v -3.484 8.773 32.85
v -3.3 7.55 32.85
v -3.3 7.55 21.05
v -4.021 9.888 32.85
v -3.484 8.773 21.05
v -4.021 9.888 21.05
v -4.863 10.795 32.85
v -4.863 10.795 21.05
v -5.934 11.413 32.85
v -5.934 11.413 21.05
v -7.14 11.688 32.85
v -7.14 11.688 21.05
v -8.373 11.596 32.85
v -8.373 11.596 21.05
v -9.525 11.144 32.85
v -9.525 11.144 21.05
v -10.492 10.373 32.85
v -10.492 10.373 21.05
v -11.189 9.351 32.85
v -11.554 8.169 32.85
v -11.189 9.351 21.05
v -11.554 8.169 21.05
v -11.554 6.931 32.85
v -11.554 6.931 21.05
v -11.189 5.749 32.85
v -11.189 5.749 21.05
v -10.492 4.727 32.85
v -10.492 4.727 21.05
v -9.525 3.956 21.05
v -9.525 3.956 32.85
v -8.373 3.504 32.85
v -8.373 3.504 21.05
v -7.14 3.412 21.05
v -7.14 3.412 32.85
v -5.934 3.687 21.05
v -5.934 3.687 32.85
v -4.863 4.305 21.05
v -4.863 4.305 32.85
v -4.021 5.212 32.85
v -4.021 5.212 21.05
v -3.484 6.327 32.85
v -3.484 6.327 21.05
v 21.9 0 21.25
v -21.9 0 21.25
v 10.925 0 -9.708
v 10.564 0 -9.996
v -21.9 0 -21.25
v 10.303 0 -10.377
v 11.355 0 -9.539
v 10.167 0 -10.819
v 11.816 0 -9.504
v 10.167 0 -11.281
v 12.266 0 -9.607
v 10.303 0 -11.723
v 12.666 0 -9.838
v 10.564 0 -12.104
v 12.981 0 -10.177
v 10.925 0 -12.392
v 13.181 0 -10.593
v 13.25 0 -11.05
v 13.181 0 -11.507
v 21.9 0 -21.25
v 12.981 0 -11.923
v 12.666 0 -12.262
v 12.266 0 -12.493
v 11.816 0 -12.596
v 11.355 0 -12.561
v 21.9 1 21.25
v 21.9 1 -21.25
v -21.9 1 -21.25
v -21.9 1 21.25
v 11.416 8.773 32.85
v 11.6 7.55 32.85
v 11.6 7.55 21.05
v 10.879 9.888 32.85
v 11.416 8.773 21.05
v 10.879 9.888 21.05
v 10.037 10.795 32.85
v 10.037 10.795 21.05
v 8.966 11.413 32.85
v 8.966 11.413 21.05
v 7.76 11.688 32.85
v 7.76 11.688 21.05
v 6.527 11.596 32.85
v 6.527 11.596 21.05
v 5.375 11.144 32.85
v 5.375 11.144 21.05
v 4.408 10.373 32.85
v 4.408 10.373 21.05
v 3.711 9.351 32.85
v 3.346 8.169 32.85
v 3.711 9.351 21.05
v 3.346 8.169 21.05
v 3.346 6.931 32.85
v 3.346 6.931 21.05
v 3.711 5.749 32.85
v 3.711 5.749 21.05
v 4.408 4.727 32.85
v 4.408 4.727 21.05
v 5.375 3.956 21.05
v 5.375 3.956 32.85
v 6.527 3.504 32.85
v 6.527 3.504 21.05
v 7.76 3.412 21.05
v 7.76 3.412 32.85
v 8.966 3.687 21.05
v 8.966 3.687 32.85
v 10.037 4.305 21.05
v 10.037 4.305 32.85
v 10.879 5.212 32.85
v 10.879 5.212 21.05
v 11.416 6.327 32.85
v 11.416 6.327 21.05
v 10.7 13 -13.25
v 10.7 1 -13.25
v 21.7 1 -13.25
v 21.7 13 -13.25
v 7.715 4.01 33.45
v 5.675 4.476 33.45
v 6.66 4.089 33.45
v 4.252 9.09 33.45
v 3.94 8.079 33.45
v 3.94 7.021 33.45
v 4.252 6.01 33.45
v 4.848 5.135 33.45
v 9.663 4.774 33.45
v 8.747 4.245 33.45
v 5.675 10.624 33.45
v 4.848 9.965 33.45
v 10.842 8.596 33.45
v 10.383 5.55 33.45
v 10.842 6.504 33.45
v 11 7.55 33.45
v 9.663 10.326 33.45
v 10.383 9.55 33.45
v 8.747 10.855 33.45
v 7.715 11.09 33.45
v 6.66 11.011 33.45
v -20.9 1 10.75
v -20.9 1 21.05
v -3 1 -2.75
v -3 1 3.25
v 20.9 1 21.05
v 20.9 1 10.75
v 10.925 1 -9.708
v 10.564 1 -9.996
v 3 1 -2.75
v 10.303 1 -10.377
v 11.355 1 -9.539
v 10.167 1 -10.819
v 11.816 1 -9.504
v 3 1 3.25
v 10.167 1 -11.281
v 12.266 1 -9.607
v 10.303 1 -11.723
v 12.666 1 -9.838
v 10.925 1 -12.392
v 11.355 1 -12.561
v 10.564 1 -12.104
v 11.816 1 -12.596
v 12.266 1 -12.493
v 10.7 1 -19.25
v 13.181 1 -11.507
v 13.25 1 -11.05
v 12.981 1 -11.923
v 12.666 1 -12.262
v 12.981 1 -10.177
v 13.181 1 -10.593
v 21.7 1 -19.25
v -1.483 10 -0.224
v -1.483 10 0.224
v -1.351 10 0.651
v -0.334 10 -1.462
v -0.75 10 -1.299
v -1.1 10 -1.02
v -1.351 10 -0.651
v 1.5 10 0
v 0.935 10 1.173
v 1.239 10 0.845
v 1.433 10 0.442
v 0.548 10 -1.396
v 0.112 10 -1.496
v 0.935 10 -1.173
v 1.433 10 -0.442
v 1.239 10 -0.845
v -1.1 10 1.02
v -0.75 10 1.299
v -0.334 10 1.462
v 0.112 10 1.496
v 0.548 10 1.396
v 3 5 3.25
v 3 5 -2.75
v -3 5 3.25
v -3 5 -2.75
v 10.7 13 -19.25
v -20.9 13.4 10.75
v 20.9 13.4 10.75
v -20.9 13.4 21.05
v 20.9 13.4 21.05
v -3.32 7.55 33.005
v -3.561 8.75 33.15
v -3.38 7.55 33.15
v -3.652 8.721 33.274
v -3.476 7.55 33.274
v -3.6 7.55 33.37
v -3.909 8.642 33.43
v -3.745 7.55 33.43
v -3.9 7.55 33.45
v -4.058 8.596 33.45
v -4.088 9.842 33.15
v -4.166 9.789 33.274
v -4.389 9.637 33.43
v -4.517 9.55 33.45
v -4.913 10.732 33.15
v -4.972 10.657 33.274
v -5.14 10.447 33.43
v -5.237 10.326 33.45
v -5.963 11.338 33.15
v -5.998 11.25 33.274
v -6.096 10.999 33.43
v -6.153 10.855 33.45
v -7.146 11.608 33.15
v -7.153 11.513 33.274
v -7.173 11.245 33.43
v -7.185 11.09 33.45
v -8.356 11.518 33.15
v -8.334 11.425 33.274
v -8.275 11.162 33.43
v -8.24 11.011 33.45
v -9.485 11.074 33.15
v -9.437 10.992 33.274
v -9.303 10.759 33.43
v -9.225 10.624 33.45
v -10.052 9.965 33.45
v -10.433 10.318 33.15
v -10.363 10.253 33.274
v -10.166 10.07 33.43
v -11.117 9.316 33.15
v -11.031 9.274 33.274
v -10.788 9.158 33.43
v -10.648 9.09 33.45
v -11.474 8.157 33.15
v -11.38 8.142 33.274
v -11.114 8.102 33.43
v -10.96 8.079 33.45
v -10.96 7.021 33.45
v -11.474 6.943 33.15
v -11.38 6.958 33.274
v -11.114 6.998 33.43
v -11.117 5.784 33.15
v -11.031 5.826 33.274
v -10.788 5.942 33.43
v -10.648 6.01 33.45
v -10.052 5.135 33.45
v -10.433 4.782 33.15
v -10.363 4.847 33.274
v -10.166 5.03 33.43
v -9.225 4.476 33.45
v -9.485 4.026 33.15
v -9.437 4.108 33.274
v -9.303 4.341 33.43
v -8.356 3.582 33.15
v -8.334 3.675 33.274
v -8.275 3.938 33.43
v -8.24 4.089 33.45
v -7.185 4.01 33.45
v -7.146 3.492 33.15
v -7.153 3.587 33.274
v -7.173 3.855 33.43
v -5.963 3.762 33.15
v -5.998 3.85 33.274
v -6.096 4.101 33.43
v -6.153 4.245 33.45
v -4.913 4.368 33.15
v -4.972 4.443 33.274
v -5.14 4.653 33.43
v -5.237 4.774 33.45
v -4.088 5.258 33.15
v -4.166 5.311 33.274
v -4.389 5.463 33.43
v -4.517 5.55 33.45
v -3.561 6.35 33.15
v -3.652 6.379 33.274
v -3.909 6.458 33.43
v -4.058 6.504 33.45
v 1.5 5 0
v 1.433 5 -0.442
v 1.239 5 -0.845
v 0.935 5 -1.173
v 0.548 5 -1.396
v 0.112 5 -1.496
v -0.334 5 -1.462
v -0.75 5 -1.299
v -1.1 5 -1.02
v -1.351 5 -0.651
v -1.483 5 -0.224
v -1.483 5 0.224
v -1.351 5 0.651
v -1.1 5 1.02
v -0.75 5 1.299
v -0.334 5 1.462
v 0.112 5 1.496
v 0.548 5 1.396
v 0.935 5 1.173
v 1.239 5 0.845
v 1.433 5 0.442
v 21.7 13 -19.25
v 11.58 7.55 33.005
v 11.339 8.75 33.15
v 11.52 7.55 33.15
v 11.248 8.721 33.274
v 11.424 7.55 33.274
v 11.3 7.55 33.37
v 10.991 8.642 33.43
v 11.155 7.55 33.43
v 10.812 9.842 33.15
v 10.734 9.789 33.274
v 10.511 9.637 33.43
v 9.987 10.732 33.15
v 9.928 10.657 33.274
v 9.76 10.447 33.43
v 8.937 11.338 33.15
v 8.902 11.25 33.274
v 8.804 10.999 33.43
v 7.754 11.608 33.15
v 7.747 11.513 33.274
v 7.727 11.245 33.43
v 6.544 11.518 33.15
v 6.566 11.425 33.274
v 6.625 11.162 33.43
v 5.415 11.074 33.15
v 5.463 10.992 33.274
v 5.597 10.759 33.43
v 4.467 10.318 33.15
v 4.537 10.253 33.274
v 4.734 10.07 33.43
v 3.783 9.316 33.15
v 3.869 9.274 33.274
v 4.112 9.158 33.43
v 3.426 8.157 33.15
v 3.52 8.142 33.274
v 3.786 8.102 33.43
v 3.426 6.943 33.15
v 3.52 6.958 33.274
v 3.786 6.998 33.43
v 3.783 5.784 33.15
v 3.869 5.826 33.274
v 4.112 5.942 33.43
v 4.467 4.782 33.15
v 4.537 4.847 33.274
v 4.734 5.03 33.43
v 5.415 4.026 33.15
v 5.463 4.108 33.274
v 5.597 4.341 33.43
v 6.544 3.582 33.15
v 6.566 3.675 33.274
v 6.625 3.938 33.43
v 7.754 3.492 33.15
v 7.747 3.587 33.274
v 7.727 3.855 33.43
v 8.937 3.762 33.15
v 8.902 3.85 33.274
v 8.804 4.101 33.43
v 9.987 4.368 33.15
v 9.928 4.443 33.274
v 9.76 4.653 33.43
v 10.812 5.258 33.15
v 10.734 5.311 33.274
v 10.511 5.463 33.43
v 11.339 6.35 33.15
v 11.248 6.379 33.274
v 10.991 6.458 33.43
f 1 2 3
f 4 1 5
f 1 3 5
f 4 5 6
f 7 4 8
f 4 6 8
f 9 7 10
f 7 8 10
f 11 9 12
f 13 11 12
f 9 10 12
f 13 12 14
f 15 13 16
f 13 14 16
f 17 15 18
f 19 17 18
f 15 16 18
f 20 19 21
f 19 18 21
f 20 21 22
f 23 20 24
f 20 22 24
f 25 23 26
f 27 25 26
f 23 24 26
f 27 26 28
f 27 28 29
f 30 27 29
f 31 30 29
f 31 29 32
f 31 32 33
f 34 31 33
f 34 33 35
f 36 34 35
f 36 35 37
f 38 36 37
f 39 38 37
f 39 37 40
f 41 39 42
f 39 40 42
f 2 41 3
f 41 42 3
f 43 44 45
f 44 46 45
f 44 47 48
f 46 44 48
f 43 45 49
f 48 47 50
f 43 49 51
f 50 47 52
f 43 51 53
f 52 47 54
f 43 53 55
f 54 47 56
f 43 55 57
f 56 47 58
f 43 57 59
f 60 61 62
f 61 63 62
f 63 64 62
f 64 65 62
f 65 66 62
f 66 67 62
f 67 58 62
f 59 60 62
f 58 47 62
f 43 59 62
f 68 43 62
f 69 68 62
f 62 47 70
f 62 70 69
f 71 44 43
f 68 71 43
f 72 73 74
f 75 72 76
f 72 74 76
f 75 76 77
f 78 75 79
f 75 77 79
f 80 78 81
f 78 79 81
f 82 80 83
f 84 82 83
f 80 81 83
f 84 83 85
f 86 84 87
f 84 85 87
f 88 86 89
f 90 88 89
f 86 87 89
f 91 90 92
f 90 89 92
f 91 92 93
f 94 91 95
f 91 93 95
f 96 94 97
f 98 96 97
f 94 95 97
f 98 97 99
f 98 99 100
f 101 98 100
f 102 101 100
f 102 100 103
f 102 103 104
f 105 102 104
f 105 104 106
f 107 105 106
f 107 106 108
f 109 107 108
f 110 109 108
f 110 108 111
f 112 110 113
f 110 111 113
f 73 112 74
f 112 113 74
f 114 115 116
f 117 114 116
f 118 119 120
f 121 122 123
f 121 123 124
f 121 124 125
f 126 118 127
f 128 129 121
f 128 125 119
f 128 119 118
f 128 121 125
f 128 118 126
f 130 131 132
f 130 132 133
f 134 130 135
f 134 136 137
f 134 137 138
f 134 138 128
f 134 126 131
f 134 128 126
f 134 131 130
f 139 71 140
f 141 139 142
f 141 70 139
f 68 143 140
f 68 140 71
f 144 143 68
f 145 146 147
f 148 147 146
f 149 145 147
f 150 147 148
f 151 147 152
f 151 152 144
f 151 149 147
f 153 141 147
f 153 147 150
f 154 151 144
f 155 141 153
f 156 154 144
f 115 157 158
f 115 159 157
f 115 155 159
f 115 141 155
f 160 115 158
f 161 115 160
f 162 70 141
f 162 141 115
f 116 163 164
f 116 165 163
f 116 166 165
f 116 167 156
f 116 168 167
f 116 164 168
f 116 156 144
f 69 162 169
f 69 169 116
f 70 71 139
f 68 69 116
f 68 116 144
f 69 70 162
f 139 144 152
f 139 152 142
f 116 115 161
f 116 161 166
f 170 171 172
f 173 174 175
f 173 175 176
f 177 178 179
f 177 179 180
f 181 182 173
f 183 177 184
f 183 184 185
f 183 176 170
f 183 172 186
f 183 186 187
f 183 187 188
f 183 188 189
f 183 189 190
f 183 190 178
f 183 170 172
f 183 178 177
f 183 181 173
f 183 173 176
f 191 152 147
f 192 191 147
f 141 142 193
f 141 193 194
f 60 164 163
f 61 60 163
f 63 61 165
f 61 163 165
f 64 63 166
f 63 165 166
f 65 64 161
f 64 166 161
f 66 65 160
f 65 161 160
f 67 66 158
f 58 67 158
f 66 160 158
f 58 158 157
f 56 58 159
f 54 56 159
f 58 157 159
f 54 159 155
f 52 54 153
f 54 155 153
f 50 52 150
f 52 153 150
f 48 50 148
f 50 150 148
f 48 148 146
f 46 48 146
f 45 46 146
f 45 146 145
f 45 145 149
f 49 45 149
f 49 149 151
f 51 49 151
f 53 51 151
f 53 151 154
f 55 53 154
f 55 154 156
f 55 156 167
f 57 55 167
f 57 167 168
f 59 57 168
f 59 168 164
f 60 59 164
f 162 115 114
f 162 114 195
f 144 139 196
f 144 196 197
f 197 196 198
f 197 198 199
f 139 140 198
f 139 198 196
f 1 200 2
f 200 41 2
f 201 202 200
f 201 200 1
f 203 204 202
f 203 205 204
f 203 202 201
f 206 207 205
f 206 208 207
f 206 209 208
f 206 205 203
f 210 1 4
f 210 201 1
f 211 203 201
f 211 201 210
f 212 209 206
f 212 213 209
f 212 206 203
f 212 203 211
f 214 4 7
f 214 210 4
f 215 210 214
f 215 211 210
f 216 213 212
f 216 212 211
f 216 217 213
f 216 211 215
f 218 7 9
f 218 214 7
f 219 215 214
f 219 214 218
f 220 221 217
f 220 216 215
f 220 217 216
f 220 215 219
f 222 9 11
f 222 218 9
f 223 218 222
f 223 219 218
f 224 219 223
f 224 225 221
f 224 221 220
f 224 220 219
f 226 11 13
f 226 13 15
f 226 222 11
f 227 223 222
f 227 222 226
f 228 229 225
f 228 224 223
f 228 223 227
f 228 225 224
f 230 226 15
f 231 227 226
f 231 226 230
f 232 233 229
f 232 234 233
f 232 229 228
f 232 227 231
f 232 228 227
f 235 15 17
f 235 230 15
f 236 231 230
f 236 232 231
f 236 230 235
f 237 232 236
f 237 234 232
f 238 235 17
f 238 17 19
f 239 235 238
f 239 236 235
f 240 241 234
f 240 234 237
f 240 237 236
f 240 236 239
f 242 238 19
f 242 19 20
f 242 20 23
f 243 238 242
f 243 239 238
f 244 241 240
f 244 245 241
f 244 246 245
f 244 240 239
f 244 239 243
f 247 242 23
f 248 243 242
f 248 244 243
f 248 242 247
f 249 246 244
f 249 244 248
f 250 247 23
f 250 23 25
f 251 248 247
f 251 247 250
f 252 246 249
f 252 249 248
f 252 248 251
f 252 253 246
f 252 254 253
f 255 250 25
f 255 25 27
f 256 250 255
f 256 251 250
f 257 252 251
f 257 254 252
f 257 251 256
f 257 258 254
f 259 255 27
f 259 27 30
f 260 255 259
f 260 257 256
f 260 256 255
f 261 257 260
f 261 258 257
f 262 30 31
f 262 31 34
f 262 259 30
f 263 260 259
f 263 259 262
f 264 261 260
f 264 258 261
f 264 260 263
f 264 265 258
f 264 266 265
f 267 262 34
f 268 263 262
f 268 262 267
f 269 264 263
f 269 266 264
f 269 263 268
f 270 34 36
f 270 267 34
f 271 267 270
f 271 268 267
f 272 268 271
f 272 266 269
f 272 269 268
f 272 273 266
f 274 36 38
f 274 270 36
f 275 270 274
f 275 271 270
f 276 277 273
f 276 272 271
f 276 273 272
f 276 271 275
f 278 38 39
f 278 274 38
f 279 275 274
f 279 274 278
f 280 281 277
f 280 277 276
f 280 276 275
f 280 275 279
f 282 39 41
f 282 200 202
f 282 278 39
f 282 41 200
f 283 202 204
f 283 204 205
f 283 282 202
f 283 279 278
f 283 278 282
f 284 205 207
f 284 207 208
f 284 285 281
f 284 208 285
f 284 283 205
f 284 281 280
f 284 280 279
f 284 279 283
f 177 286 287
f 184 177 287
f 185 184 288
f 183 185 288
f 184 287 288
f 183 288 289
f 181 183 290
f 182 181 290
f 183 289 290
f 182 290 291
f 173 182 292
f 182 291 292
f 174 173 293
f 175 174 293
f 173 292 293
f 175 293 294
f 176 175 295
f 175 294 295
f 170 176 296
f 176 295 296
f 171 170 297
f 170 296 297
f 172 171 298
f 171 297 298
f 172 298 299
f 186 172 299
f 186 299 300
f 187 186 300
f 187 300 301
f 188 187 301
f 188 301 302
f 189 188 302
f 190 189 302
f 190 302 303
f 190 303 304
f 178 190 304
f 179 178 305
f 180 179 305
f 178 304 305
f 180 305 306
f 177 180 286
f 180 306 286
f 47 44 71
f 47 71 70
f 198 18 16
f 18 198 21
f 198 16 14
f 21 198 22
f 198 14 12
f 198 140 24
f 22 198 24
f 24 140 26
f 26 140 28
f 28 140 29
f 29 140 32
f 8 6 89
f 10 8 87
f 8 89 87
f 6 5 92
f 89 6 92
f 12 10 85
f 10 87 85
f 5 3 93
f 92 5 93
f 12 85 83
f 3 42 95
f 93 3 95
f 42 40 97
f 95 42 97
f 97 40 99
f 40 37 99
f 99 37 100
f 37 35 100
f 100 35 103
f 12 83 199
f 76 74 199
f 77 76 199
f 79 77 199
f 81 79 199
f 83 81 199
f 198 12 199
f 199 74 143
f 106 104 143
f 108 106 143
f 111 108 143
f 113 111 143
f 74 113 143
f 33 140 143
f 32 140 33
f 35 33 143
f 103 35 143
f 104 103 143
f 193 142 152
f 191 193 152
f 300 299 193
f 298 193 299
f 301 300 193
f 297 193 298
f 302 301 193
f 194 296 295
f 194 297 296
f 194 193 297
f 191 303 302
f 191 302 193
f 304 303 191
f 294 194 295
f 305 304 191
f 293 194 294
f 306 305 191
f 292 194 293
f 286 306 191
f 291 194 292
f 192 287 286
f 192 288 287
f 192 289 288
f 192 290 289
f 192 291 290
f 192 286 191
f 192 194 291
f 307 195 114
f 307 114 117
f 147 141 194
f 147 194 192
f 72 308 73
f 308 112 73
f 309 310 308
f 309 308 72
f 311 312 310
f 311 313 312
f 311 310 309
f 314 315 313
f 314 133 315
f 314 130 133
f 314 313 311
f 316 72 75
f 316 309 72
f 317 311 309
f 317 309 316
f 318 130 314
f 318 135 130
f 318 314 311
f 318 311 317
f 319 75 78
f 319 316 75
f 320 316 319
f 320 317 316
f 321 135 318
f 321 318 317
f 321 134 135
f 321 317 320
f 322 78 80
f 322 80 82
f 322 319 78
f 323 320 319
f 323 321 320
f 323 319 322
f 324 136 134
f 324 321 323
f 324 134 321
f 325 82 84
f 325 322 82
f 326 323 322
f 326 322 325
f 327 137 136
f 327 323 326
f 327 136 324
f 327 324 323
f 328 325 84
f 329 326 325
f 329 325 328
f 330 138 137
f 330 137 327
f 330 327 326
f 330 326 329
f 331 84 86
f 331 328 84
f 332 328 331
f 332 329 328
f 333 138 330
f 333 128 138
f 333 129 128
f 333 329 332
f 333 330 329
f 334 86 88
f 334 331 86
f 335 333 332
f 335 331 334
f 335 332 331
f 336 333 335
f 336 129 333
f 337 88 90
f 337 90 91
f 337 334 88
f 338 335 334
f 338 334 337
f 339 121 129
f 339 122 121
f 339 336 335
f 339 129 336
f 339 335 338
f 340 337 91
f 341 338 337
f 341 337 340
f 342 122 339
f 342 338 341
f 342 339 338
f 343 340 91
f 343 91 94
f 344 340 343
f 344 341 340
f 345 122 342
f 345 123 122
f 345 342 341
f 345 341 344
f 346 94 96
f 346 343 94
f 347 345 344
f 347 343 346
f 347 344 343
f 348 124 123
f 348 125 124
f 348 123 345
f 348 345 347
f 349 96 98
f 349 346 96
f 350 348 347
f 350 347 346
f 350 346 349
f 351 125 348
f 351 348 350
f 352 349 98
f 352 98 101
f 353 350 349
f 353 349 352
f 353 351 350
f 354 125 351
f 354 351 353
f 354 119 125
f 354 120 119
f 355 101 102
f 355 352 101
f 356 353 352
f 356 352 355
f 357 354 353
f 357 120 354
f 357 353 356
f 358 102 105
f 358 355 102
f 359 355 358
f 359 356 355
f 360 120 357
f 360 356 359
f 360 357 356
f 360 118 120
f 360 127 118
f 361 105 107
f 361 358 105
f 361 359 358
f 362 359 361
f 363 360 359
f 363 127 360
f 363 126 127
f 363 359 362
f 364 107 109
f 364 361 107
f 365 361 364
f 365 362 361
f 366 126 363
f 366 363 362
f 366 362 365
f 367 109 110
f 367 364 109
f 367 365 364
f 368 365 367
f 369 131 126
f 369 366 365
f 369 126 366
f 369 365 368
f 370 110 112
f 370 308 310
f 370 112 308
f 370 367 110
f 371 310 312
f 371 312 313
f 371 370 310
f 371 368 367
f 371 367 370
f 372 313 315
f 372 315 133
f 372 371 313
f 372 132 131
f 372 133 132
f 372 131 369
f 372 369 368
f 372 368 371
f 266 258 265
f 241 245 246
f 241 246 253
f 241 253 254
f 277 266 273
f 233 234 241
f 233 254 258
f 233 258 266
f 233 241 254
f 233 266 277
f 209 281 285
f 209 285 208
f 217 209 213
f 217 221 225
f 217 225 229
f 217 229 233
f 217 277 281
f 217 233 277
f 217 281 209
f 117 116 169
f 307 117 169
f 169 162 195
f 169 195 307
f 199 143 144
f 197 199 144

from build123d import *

# Parameters (mm, degrees)
SKETCH1_W           = 43.8
SKETCH1_H           = 42.5
BOSS_EXTRUDE1_DEPTH = 1
SKETCH2_W           = 41.8
SKETCH2_H           = 10.3
BOSS_EXTRUDE2_DEPTH = 12.4
SKETCH3_R           = 4.15
BOSS_EXTRUDE3_DEPTH = 12.4
SKETCH4_W           = 11
SKETCH4_H           = 6
BOSS_EXTRUDE4_DEPTH = 12
SKETCH5_W           = 6
SKETCH5_H           = 6
BOSS_EXTRUDE5_DEPTH = 4
SKETCH6_R           = 1.5
BOSS_EXTRUDE6_DEPTH = 5
SKETCH7_R           = 1.55
CUT_EXTRUDE1_DEPTH  = 2
FILLET1_R           = 0.6


with BuildPart() as part:
    # Sketch1 → Boss-Extrude1 (new body)
    with BuildSketch(Plane(origin=(0, 0, 0), x_dir=(1, 0, 0), z_dir=(0, 1, 0))):
        Rectangle(SKETCH1_W, SKETCH1_H)
    extrude(amount=BOSS_EXTRUDE1_DEPTH)

    # Sketch2 → Boss-Extrude2 (add)
    with BuildSketch(Plane(origin=(0, 1, 0), x_dir=(1, 0, 0), z_dir=(0, 1, 0))):
        with Locations((0, -15.9)):
            Rectangle(SKETCH2_W, SKETCH2_H)
    extrude(amount=BOSS_EXTRUDE2_DEPTH)

    # Sketch3 → Boss-Extrude3 (add)
    with BuildSketch(Plane.XY.offset(21.05)):
        with Locations((7.45, 7.55)):
            Circle(SKETCH3_R)
        with Locations((-7.45, 7.55)):
            Circle(SKETCH3_R)
    extrude(amount=BOSS_EXTRUDE3_DEPTH)

    # Sketch4 → Boss-Extrude4 (add)
    with BuildSketch(Plane(origin=(0, 1, 0), x_dir=(1, 0, 0), z_dir=(0, 1, 0))):
        with Locations((16.2, 16.25)):
            Rectangle(SKETCH4_W, SKETCH4_H)
    extrude(amount=BOSS_EXTRUDE4_DEPTH)

    # Sketch5 → Boss-Extrude5 (add)
    with BuildSketch(Plane(origin=(0, 1, 0), x_dir=(1, 0, 0), z_dir=(0, 1, 0))):
        with Locations((0, -0.25)):
            Rectangle(SKETCH5_W, SKETCH5_H)
    extrude(amount=BOSS_EXTRUDE5_DEPTH)

    # Sketch6 → Boss-Extrude6 (add)
    with BuildSketch(Plane(origin=(0, 5, 0), x_dir=(1, 0, 0), z_dir=(0, 1, 0))):
        Circle(SKETCH6_R)
    extrude(amount=BOSS_EXTRUDE6_DEPTH)

    # Sketch7 → Cut-Extrude1 (cut, through all)
    with BuildSketch(Plane(origin=(0, 1, 0), x_dir=(1, 0, 0), z_dir=(0, 1, 0))):
        with Locations((11.7, 11.05)):
            Circle(SKETCH7_R)
    extrude(amount=-CUT_EXTRUDE1_DEPTH, mode=Mode.SUBTRACT)

    # Fillet1
    fillet1_edges = [part.edges().sort_by_distance(p)[0] for p in [
        (3.3, 7.55, 33.45),
        (-11.6, 7.55, 33.45),
    ]]
    fillet(fillet1_edges, radius=FILLET1_R)


solid = part.part
